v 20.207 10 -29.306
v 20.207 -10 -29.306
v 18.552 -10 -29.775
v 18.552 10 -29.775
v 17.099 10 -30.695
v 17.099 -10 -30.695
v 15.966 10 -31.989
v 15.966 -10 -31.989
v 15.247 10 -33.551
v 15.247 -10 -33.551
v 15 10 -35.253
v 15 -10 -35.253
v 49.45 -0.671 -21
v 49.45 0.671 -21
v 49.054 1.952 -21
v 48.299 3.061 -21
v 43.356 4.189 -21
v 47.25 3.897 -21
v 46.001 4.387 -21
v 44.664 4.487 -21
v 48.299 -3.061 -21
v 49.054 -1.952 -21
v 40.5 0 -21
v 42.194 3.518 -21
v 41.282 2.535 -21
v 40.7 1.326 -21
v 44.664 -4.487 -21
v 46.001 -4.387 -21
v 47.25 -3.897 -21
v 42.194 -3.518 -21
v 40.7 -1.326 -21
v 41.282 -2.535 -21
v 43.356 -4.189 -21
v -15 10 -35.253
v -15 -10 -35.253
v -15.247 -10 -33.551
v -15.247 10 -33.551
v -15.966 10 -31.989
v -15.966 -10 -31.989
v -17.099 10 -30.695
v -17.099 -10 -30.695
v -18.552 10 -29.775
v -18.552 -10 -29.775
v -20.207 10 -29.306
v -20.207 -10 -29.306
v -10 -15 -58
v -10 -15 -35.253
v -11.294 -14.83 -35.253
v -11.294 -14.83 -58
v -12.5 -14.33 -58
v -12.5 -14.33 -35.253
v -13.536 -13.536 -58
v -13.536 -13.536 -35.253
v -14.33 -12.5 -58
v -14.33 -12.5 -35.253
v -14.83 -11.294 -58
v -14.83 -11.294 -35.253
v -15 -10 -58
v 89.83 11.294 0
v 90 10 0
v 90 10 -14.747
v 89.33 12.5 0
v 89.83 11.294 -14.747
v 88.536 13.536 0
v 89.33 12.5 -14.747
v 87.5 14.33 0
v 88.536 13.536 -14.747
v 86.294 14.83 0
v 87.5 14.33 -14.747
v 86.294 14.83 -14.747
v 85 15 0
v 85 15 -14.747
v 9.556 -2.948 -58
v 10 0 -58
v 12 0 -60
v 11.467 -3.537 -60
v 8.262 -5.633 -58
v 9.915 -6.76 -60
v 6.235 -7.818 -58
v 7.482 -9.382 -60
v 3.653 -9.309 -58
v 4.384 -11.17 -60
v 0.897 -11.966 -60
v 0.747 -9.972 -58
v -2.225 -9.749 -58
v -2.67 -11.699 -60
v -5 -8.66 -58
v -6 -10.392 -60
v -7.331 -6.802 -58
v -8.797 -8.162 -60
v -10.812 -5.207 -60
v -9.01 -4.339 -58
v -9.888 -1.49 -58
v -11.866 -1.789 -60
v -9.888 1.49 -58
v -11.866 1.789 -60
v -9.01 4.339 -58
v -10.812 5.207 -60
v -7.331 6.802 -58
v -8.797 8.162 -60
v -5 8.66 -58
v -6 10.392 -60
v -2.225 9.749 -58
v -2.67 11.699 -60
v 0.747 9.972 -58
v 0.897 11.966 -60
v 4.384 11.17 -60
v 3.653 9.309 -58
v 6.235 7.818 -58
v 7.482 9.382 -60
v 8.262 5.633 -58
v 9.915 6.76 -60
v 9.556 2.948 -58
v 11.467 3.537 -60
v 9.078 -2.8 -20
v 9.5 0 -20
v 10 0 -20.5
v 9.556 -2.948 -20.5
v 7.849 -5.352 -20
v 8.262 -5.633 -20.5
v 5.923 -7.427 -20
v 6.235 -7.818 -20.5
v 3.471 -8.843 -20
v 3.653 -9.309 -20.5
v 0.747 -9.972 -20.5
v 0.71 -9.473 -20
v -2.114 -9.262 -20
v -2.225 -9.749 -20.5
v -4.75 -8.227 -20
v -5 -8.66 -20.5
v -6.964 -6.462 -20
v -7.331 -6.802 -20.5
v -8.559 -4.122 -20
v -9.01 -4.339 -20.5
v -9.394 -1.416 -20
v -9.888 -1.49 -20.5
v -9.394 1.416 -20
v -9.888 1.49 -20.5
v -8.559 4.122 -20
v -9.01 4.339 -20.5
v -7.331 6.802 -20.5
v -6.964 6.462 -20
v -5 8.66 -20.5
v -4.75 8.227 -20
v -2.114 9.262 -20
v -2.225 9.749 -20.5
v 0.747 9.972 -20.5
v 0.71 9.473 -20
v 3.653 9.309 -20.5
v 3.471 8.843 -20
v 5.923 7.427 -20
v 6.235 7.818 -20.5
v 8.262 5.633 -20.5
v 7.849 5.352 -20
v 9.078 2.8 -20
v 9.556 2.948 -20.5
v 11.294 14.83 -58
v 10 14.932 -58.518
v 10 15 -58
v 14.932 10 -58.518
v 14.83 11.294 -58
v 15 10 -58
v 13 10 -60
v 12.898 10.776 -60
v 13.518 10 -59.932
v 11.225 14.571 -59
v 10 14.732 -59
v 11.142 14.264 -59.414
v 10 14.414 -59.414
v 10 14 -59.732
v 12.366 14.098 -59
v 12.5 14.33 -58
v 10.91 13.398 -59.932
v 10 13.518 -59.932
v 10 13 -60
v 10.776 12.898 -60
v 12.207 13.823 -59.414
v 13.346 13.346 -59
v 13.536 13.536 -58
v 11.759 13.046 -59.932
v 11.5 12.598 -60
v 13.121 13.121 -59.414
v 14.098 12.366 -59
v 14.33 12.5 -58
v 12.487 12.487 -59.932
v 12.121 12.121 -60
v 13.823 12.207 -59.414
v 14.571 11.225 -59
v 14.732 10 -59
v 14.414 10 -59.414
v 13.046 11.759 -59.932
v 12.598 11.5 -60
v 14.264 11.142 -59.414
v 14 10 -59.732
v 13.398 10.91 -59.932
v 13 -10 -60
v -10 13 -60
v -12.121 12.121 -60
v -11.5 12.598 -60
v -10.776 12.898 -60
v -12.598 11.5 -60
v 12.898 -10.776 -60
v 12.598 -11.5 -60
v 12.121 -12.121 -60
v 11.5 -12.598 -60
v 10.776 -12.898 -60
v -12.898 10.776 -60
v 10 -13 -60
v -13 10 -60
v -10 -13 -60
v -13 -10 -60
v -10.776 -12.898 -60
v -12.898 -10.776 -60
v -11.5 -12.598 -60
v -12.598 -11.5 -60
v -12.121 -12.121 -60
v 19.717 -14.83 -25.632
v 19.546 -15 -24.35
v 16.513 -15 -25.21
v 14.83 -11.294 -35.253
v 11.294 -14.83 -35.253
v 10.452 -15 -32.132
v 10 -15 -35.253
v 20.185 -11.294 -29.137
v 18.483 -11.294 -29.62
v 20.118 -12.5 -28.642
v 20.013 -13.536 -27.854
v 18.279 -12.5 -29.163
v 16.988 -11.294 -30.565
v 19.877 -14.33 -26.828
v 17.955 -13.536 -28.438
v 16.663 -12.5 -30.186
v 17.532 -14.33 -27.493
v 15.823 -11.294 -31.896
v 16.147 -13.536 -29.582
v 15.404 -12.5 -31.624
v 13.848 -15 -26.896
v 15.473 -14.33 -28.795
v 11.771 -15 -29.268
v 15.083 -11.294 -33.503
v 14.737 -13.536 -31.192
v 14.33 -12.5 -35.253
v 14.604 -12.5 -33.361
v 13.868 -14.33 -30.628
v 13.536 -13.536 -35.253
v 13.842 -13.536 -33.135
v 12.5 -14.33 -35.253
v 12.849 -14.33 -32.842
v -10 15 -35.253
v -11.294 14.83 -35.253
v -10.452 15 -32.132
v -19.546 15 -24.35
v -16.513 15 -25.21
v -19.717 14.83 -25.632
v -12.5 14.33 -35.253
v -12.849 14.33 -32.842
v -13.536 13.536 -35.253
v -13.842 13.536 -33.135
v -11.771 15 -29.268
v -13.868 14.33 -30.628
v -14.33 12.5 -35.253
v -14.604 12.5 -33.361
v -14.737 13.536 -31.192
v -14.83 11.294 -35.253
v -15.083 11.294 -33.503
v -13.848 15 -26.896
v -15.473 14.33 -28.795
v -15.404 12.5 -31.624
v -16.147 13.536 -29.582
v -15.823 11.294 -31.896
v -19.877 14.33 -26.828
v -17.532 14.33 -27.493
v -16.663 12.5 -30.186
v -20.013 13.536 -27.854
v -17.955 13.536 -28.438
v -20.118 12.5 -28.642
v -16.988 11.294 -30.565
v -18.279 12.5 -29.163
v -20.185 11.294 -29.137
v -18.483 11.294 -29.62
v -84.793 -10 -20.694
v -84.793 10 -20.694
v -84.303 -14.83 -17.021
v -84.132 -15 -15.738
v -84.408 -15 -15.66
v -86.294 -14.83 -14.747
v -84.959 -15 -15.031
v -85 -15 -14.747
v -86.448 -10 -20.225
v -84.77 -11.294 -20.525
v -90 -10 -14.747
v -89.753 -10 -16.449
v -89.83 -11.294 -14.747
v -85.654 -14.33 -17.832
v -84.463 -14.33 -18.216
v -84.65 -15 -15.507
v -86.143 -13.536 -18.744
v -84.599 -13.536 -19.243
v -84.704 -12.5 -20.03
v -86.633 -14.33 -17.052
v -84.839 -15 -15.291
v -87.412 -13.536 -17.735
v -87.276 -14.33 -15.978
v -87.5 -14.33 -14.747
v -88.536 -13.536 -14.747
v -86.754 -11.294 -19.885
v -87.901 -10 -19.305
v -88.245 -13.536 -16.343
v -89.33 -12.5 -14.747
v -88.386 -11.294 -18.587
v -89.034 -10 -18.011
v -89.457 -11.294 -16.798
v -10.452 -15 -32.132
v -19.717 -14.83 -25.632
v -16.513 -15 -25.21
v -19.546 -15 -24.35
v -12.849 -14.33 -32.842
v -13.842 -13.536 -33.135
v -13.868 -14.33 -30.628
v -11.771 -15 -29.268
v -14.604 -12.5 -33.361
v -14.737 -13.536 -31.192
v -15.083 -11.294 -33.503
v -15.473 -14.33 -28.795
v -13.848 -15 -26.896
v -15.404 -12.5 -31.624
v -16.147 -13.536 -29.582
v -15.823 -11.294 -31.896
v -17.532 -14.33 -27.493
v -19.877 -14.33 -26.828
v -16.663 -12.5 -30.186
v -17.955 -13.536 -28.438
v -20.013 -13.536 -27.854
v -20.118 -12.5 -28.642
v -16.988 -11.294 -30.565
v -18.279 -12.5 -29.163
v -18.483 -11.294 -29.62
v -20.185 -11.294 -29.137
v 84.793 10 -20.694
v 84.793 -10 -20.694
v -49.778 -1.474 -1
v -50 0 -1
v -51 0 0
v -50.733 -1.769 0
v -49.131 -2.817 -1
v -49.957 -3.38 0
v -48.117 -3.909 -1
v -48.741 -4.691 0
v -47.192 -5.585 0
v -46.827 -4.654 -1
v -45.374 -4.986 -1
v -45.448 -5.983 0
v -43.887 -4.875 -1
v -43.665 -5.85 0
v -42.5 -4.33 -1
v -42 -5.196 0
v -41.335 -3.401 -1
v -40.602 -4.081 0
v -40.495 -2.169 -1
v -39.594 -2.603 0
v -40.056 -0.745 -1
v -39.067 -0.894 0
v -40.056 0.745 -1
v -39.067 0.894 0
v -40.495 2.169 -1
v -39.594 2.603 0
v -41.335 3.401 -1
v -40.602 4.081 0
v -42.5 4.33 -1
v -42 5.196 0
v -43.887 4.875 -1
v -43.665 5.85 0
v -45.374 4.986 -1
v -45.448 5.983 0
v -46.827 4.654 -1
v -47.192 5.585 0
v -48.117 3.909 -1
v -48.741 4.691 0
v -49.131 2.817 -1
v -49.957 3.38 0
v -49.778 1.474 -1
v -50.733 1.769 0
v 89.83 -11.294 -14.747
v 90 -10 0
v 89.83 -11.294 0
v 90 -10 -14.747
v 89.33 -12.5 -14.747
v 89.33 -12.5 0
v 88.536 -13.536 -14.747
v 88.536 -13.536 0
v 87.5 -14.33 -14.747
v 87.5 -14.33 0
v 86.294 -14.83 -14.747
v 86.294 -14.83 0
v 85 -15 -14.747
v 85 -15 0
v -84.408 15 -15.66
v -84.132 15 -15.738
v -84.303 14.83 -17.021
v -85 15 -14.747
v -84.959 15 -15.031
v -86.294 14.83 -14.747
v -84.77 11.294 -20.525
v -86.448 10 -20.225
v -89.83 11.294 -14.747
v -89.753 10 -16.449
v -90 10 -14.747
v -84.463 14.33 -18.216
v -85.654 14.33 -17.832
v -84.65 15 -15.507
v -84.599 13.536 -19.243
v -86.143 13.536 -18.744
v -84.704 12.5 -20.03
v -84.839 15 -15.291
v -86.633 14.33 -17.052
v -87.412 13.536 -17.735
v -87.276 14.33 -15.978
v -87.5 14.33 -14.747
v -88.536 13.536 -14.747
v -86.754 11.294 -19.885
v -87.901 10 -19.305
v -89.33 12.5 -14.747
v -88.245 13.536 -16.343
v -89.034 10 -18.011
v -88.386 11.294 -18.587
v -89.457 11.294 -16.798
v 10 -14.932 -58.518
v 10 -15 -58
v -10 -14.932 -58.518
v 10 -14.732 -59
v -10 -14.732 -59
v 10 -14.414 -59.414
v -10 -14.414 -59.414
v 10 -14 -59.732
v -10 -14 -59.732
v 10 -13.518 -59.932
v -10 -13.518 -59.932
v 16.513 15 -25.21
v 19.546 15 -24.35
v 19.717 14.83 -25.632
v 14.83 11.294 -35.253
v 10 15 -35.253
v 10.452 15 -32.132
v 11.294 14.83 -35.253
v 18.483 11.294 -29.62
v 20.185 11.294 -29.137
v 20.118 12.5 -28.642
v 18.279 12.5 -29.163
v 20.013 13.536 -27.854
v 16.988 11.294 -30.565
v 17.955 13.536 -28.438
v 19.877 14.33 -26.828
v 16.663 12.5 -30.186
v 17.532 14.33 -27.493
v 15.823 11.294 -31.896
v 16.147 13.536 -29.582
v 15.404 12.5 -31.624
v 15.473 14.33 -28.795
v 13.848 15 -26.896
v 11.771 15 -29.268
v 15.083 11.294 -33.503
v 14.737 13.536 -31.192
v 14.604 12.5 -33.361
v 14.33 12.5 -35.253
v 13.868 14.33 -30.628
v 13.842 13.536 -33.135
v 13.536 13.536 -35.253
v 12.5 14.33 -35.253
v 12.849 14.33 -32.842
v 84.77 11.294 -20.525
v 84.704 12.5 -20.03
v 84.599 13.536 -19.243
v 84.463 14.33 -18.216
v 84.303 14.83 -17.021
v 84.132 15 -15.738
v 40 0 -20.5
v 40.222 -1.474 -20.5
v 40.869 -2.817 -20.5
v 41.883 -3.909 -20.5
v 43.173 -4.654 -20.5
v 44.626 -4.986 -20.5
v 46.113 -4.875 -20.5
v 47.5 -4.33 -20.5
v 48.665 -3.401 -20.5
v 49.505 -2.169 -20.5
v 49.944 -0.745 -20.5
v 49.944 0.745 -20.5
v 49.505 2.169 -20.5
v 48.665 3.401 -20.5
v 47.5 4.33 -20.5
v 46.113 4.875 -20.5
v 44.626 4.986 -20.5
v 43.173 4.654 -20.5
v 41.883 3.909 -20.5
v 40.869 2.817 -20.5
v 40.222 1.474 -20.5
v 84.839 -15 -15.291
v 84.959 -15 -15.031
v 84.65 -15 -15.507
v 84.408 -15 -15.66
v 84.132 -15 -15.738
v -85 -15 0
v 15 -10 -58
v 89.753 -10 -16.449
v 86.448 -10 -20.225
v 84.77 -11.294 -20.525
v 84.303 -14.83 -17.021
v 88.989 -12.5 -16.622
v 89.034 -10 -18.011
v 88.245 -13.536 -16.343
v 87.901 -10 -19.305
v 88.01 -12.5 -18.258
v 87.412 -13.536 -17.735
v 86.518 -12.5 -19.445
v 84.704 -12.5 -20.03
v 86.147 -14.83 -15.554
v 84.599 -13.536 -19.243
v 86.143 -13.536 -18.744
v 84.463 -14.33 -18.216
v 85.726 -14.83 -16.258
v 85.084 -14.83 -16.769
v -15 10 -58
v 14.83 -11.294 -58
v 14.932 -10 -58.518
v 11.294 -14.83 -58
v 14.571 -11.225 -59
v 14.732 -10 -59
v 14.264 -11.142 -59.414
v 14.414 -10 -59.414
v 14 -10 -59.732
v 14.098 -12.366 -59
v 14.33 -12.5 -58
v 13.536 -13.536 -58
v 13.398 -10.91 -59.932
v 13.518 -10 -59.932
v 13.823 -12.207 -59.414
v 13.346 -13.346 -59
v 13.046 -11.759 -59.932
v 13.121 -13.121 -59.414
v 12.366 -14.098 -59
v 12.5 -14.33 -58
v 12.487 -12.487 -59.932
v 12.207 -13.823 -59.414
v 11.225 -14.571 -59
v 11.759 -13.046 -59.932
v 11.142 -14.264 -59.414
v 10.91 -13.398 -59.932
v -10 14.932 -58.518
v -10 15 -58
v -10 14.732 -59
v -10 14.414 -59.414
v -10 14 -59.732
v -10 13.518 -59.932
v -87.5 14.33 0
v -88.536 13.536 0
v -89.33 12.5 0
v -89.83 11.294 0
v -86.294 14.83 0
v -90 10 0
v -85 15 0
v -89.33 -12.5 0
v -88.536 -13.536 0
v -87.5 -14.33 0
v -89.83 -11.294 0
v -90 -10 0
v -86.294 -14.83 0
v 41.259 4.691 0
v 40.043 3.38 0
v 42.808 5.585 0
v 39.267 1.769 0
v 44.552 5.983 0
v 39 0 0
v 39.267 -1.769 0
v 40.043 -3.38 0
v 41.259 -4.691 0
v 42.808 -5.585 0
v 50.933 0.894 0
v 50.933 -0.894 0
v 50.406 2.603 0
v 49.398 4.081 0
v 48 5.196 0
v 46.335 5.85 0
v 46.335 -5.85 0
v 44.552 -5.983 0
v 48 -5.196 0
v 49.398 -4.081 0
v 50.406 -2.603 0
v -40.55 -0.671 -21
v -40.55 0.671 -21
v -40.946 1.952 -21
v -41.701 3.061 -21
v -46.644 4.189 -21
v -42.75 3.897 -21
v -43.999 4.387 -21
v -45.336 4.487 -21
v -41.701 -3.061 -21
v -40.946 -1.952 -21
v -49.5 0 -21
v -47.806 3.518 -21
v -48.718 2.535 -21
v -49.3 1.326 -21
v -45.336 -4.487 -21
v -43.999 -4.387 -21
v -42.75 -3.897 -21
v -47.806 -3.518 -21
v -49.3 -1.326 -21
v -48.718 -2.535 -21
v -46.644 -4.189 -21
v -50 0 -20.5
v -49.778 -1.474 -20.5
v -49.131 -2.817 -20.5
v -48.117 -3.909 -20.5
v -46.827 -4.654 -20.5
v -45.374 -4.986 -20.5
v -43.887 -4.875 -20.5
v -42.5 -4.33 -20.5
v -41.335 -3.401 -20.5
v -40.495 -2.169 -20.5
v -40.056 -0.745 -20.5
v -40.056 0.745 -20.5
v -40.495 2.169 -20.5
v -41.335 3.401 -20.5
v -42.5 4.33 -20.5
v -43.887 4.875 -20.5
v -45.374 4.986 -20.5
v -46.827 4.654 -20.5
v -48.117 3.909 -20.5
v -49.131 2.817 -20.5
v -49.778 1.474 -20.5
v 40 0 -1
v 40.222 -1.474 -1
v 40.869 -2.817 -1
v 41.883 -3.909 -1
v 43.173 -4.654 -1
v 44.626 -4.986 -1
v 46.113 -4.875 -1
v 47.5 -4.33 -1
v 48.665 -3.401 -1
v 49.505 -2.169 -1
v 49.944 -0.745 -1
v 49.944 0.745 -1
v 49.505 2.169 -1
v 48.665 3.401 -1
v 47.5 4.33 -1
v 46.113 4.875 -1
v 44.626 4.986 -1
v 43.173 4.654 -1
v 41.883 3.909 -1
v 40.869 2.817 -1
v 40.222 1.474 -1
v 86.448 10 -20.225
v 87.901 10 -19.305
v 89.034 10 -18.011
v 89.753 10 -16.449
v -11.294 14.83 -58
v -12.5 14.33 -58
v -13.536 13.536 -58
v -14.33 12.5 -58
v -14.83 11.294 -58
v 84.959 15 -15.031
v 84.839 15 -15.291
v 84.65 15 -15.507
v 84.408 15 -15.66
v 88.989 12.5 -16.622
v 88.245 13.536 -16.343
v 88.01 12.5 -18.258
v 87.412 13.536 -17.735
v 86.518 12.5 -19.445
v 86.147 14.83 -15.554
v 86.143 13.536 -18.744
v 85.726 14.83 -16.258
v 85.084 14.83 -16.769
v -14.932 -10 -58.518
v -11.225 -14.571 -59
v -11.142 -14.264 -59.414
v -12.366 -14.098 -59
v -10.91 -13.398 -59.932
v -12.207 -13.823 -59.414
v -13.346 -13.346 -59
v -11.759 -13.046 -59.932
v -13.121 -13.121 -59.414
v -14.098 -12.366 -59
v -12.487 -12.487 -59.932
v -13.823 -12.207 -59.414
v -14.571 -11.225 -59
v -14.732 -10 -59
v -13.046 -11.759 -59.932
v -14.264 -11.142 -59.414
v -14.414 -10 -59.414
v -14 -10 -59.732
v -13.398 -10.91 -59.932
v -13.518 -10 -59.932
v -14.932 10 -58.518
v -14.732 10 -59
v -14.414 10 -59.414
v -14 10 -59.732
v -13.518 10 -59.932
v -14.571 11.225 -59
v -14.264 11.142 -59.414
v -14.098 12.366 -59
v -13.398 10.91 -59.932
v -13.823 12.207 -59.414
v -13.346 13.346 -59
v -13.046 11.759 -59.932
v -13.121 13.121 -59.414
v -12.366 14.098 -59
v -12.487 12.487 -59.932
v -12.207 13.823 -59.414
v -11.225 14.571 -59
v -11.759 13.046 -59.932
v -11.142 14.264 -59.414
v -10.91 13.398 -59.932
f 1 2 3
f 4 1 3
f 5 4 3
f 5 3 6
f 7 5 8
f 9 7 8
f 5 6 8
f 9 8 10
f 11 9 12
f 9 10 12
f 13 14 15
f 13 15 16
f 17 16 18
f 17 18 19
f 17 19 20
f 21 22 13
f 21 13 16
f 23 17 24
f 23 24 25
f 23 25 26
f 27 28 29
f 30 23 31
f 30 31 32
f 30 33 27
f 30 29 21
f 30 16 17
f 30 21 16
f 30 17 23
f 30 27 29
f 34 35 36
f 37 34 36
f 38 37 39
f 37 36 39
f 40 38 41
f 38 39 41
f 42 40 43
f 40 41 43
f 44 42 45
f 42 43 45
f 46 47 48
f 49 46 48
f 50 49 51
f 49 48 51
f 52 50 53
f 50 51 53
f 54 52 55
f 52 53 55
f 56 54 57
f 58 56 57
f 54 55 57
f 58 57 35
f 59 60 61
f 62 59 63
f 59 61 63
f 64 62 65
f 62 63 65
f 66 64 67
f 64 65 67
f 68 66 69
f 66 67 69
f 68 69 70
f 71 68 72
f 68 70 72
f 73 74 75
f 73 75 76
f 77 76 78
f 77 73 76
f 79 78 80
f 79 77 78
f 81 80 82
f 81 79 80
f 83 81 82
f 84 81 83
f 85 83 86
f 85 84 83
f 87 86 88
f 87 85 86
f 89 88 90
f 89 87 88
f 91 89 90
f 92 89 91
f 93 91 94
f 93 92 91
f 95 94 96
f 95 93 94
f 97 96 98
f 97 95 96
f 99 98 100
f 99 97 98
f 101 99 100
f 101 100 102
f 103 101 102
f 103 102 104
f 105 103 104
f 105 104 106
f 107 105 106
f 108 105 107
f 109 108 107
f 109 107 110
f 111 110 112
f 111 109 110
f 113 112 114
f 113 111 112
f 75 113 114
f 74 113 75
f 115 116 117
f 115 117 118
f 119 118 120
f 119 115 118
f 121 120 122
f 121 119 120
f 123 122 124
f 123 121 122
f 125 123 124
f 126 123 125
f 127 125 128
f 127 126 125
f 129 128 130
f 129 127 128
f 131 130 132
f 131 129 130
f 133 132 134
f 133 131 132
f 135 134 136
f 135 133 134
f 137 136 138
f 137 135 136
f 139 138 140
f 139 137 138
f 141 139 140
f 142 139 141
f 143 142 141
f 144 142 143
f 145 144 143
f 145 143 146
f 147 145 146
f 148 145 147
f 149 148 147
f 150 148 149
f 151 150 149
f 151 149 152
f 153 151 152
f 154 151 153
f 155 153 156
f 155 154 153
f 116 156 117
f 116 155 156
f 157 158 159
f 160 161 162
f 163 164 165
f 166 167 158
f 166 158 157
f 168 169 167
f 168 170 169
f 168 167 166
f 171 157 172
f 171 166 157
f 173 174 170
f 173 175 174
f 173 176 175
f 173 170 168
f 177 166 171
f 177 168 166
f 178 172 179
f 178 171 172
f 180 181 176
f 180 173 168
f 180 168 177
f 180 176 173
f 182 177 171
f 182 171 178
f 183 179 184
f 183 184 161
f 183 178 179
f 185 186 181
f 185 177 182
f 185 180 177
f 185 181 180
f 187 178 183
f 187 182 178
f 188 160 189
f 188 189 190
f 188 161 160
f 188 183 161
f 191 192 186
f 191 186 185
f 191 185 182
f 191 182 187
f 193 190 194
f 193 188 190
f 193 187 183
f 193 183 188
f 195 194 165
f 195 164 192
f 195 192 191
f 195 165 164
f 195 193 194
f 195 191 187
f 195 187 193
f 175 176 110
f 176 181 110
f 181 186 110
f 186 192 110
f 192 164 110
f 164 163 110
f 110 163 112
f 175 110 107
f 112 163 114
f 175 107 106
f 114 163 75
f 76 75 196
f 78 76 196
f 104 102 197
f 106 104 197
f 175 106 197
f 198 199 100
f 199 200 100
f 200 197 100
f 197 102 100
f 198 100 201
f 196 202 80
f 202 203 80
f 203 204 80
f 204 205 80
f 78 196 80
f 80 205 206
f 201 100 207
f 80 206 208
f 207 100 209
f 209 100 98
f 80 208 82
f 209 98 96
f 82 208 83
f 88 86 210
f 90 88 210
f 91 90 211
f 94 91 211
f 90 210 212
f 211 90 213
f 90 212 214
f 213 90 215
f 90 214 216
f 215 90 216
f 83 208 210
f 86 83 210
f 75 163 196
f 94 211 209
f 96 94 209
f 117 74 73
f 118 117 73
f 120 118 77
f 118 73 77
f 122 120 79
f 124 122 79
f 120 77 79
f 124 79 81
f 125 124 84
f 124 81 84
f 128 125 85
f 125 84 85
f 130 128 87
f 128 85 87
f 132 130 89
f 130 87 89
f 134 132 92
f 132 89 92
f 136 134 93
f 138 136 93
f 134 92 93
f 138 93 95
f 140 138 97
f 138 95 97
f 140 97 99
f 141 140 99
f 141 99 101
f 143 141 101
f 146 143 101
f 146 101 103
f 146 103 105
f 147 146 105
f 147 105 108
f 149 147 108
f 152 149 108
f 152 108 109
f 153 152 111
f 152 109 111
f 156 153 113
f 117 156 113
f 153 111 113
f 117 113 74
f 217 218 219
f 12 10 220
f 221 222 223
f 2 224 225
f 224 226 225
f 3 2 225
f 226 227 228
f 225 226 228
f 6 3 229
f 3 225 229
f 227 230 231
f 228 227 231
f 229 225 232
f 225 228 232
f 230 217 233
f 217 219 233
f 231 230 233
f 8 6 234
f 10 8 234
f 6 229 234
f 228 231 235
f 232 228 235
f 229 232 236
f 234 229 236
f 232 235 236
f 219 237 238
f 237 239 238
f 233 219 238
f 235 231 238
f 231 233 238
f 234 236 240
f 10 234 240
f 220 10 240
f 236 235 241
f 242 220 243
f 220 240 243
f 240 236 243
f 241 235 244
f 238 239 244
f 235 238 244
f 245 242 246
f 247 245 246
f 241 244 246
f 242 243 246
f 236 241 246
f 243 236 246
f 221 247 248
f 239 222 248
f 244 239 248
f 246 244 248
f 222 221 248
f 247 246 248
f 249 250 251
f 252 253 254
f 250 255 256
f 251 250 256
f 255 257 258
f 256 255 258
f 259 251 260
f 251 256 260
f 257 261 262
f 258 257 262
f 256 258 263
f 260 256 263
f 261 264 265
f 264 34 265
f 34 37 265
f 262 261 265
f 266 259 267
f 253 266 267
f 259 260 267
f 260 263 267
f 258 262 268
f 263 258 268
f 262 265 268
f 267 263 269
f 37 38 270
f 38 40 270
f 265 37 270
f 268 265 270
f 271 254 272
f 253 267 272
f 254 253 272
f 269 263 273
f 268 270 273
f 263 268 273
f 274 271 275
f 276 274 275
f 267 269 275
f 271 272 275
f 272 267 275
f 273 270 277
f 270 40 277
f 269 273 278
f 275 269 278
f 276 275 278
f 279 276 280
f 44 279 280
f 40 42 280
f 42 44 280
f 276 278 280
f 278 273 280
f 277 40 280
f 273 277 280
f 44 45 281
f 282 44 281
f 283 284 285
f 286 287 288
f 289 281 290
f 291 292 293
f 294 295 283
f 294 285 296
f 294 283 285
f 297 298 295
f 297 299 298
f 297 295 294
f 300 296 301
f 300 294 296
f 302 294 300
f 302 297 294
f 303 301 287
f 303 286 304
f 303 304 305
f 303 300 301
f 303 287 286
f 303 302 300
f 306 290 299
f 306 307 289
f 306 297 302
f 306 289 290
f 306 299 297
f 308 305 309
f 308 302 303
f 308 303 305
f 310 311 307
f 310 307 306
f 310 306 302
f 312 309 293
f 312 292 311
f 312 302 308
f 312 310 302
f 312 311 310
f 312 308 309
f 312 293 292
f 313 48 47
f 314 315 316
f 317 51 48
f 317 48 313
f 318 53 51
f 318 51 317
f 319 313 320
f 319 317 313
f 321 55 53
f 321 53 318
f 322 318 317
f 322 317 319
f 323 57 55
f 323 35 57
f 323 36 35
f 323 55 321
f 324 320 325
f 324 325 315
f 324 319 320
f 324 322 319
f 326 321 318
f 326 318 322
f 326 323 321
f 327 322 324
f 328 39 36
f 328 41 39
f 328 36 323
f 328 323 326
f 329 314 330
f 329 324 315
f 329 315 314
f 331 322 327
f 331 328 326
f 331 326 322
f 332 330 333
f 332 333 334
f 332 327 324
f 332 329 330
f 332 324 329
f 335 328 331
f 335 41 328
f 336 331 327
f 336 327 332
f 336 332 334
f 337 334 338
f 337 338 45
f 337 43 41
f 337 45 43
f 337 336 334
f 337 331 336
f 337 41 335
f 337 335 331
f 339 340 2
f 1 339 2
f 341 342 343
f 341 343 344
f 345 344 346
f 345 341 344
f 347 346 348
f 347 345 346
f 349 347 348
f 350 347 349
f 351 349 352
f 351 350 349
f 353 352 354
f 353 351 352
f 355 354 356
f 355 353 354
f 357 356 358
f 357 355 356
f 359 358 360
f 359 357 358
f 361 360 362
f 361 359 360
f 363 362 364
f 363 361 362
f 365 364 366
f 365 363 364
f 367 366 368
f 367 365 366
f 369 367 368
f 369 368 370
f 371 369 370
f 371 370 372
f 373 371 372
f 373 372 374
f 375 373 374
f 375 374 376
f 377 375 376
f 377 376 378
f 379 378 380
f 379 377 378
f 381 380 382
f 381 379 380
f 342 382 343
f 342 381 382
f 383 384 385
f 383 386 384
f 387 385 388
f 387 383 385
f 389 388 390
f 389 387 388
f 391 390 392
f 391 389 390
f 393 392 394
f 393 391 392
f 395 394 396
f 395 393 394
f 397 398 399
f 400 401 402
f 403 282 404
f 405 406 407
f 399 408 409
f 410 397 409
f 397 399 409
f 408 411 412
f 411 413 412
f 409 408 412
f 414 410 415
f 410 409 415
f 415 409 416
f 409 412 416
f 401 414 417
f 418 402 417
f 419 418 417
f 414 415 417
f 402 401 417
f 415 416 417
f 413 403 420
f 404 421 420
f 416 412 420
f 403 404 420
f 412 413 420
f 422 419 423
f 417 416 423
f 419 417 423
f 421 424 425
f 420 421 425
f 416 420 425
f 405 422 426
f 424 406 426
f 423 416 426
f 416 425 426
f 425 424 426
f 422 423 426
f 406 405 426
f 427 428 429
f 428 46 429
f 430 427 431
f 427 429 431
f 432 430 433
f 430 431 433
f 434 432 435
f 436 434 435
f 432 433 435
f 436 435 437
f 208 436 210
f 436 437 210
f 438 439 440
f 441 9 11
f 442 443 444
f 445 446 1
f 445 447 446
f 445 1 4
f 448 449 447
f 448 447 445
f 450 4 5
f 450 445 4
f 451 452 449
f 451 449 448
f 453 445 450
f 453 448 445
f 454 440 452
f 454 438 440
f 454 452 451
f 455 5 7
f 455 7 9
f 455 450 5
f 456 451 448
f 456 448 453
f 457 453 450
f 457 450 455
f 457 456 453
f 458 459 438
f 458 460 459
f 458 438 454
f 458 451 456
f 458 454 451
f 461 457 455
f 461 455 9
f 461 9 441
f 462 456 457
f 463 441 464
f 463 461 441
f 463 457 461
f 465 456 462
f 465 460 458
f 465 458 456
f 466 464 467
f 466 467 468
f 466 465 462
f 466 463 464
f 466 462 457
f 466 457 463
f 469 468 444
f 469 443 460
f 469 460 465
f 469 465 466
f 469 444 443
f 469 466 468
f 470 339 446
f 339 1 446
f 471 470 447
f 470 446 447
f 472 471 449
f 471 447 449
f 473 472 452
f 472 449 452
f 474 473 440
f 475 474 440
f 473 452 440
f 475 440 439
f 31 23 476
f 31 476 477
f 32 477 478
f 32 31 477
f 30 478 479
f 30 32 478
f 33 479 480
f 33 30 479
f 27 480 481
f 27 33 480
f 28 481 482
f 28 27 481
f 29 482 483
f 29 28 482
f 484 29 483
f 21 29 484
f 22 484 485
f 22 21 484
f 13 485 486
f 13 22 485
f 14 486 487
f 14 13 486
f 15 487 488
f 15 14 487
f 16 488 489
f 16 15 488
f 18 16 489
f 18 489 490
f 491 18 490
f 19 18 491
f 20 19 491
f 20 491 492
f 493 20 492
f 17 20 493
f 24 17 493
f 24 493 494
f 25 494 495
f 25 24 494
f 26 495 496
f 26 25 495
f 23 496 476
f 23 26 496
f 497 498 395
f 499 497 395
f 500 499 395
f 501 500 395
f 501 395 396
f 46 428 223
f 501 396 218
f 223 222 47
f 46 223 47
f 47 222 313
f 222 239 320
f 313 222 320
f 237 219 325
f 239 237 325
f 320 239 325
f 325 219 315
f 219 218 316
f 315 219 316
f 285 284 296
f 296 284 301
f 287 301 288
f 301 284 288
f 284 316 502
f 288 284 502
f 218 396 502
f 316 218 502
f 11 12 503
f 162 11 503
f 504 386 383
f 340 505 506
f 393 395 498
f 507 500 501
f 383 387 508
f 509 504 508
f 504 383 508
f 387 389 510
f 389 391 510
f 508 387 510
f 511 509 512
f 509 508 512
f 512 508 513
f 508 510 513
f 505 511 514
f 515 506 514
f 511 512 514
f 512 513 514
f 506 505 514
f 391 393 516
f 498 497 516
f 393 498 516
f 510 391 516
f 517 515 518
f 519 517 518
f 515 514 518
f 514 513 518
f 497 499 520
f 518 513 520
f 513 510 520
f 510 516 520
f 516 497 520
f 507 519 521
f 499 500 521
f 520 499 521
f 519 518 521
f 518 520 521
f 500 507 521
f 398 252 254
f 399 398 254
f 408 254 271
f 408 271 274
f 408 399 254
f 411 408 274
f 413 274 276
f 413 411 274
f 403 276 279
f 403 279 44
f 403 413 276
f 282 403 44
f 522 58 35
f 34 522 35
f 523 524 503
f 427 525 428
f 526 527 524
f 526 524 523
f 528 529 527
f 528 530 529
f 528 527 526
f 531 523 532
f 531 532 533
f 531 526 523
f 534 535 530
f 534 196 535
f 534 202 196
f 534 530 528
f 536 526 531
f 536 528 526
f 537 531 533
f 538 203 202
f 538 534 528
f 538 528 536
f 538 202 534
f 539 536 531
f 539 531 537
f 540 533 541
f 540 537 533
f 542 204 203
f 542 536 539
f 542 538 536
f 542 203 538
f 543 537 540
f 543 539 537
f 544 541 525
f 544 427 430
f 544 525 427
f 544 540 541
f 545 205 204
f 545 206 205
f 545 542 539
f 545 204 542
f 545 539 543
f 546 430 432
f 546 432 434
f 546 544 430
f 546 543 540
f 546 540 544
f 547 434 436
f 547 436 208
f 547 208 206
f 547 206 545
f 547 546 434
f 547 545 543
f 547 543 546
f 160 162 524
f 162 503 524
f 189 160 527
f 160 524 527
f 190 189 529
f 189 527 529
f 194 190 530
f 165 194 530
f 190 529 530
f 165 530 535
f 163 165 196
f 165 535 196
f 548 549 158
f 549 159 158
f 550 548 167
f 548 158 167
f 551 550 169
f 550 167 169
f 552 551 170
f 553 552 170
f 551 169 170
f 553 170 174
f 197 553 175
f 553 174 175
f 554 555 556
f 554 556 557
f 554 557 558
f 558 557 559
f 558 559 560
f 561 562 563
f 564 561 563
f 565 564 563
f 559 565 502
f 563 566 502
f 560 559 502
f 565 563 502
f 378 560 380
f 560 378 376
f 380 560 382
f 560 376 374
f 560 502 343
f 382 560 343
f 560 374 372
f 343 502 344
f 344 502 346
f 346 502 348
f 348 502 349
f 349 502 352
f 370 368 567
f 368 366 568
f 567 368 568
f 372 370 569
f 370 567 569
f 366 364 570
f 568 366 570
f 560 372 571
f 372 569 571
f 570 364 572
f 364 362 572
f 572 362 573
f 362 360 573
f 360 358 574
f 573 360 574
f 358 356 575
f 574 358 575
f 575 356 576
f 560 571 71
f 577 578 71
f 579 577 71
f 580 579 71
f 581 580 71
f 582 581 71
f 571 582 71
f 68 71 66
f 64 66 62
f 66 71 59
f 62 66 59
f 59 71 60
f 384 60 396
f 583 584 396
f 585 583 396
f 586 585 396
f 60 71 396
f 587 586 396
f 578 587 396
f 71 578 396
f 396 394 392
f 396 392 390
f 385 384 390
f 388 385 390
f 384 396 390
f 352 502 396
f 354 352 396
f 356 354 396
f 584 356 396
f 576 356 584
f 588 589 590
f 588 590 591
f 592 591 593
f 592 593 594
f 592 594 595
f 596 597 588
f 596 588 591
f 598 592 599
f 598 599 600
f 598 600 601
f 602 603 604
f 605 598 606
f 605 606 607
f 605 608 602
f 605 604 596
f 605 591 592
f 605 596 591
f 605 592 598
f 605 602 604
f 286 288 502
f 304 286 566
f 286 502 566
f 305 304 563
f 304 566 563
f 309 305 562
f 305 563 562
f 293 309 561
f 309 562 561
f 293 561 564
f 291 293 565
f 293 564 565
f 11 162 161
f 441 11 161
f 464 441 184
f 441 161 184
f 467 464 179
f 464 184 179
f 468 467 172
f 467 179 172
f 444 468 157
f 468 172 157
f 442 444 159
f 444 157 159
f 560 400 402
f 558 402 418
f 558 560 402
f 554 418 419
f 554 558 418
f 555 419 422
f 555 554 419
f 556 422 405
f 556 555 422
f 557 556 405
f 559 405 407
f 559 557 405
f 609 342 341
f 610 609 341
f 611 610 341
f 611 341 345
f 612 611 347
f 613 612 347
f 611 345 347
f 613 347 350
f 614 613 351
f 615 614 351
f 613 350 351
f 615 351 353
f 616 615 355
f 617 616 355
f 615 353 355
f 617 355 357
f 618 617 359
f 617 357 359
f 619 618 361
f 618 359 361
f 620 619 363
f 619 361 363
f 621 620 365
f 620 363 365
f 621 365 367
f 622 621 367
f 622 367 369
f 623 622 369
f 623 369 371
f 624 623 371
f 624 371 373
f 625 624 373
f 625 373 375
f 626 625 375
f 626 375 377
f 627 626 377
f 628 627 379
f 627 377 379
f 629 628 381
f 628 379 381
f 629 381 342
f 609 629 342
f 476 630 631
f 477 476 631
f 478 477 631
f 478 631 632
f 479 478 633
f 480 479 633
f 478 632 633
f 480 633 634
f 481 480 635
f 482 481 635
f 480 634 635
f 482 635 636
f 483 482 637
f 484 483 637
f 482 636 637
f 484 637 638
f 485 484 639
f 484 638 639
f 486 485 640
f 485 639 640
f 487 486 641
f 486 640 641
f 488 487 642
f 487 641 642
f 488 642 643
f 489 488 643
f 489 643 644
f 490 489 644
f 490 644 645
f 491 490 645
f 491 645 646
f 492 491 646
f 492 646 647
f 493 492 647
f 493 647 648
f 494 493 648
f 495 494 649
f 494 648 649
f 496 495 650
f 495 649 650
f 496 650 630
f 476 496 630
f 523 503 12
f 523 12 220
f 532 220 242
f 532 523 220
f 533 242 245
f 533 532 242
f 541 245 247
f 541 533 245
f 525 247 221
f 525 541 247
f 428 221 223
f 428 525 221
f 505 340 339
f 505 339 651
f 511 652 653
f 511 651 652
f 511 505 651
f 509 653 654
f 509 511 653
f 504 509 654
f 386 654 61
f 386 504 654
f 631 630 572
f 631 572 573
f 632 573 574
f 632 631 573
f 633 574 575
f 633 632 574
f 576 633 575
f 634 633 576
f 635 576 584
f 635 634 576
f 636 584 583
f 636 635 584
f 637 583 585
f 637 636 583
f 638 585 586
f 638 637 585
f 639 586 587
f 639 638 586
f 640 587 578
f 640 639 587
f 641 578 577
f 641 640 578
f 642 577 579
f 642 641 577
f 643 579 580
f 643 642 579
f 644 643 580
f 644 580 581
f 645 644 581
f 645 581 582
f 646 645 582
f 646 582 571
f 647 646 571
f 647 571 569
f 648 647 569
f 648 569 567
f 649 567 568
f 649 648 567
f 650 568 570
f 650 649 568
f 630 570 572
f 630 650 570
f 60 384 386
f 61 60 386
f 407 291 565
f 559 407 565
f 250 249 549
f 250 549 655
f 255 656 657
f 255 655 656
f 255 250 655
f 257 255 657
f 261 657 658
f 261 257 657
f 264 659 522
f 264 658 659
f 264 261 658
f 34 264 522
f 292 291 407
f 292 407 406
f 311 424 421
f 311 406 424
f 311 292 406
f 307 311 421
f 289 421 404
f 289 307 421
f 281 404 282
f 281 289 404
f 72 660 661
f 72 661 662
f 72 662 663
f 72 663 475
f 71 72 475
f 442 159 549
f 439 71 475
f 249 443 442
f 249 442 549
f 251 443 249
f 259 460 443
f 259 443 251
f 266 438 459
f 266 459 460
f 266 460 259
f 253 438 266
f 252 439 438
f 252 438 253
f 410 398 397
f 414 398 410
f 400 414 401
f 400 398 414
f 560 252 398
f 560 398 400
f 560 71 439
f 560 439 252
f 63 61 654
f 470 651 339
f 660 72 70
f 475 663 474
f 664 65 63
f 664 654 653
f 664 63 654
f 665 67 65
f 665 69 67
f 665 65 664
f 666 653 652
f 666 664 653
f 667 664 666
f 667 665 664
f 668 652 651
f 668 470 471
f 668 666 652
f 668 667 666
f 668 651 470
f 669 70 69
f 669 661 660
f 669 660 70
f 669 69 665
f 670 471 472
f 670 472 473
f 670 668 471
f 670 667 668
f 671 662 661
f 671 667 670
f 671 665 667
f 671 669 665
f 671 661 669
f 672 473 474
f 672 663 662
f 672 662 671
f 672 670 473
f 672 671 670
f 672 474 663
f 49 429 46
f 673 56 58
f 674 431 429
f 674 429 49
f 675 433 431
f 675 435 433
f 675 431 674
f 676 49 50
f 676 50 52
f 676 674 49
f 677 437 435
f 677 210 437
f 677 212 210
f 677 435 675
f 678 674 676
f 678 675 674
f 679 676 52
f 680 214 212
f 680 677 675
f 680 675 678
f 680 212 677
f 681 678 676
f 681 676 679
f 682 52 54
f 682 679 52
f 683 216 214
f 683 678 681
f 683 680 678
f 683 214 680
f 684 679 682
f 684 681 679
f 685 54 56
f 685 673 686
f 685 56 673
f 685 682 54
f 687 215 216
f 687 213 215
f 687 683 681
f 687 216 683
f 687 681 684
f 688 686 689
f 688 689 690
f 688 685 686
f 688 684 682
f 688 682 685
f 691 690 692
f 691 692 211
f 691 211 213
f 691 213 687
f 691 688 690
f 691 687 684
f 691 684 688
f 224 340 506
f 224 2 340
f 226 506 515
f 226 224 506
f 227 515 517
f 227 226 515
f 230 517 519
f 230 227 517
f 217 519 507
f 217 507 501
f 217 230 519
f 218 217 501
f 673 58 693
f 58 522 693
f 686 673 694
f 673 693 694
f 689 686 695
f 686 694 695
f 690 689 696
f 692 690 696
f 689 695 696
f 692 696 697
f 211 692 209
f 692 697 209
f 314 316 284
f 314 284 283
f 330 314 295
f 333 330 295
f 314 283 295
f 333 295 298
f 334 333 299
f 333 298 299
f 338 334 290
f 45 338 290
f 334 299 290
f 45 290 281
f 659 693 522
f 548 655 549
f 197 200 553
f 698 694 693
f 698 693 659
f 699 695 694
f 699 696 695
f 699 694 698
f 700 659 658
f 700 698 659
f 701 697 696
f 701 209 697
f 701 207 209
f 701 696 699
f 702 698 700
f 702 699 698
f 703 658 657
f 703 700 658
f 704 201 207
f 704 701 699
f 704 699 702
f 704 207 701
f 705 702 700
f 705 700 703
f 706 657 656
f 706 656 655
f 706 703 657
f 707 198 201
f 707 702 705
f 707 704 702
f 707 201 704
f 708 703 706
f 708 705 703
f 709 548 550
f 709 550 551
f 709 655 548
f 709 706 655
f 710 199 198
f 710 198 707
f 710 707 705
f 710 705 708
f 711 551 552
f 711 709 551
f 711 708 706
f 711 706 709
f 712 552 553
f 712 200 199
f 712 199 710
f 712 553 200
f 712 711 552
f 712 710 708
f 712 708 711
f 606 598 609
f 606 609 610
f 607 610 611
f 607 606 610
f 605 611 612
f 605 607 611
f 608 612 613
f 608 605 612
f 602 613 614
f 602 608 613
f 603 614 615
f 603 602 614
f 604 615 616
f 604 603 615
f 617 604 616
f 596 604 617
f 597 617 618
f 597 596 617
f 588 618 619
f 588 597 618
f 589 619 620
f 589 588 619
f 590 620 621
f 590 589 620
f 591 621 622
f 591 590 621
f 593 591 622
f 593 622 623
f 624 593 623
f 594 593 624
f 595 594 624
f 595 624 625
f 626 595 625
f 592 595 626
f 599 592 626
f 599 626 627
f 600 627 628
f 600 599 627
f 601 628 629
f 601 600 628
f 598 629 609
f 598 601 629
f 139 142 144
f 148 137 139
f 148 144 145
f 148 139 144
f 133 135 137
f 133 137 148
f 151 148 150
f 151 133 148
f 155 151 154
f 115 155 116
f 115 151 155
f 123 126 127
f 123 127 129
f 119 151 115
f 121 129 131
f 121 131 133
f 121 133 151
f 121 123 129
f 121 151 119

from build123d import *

# Parameters (mm, degrees)
PAD_DEPTH       = 15
SKETCH001_R     = 5
POCKET_DEPTH    = 21
SKETCH002_R     = 10
POCKET001_DEPTH = 40
FILLET_R        = 5
CHAMFER_SIZE    = 2
CHAMFER001_SIZE = 0.5
CHAMFER002_SIZE = 1
CHAMFER003_SIZE = 0.5
FILLET001_R     = 2


with BuildPart() as part:
    # Sketch → Pad (new body, symmetric)
    with BuildSketch(Plane.XZ):
        with BuildLine():
            Line((90, 0), (90, -14.746902))
            ThreePointArc((84.792982, -20.694269), (88.514305, -18.699249), (90, -14.746902))
            Line((84.792982, -20.694269), (20.207018, -29.305731))
            ThreePointArc((20.207018, -29.305731), (16.485695, -31.300751), (15, -35.253098))
            Line((15, -35.253098), (15, -60))
            Line((15, -60), (-15, -60))
            Line((-15, -60), (-15, -35.253098))
            ThreePointArc((-15, -35.253098), (-16.485695, -31.300751), (-20.207018, -29.305731))
            Line((-20.207018, -29.305731), (-84.792982, -20.694269))
            ThreePointArc((-90, -14.746902), (-88.514305, -18.699249), (-84.792982, -20.694269))
            Line((-90, -14.746902), (-90, 0))
            Line((-90, 0), (0, 0))
            Line((0, 0), (90, 0))
        make_face()
    extrude(amount=PAD_DEPTH, both=True)

    # Sketch001 (on Face14 of Pad) → Pocket (cut)
    with BuildSketch(Plane(origin=(0, 0, 0), x_dir=(-1, 0, 0), z_dir=(0, 0, 1))):
        with Locations((-45, 0)):
            Circle(SKETCH001_R)
        with Locations((45, 0)):
            Circle(SKETCH001_R)
    extrude(amount=-POCKET_DEPTH, mode=Mode.SUBTRACT)

    # Sketch002 (on Face14 of Pocket) → Pocket001 (cut)
    with BuildSketch(Plane(origin=(0, 0, -60), x_dir=(1, 0, 0), z_dir=(0, 0, -1))):
        Circle(SKETCH002_R)
    extrude(amount=-POCKET001_DEPTH, mode=Mode.SUBTRACT)

    # Fillet
    fillet_edges = [part.edges().sort_by_distance(p)[0] for p in [
        (90, -15, -7.373451),
        (-90, -15, -7.373451),
        (-90, 15, -7.373451),
        (90, 15, -7.373451),
    ]]
    fillet(fillet_edges, radius=FILLET_R)

    # Chamfer
    chamfer_edges = [part.edges().sort_by_distance(p)[0] for p in [
        (-10, 0, -60),
    ]]
    chamfer(chamfer_edges, length=CHAMFER_SIZE)

    # Chamfer001
    chamfer001_edges = [part.edges().sort_by_distance(p)[0] for p in [
        (-10, 0, -20),
    ]]
    chamfer(chamfer001_edges, length=CHAMFER001_SIZE)

    # Chamfer002
    chamfer002_edges = [part.edges().sort_by_distance(p)[0] for p in [
        (-40, 0, 0),
        (50, 0, 0),
    ]]
    chamfer(chamfer002_edges, length=CHAMFER002_SIZE)

    # Chamfer003
    chamfer003_edges = [part.edges().sort_by_distance(p)[0] for p in [
        (50, 0, -21),
        (-40, 0, -21),
    ]]
    chamfer(chamfer003_edges, length=CHAMFER003_SIZE)

    # Fillet001
    fillet001_edges = [part.edges().sort_by_distance(p)[0] for p in [
        (0, -15, -60),
    ]]
    fillet(fillet001_edges, radius=FILLET001_R)


solid = part.part
